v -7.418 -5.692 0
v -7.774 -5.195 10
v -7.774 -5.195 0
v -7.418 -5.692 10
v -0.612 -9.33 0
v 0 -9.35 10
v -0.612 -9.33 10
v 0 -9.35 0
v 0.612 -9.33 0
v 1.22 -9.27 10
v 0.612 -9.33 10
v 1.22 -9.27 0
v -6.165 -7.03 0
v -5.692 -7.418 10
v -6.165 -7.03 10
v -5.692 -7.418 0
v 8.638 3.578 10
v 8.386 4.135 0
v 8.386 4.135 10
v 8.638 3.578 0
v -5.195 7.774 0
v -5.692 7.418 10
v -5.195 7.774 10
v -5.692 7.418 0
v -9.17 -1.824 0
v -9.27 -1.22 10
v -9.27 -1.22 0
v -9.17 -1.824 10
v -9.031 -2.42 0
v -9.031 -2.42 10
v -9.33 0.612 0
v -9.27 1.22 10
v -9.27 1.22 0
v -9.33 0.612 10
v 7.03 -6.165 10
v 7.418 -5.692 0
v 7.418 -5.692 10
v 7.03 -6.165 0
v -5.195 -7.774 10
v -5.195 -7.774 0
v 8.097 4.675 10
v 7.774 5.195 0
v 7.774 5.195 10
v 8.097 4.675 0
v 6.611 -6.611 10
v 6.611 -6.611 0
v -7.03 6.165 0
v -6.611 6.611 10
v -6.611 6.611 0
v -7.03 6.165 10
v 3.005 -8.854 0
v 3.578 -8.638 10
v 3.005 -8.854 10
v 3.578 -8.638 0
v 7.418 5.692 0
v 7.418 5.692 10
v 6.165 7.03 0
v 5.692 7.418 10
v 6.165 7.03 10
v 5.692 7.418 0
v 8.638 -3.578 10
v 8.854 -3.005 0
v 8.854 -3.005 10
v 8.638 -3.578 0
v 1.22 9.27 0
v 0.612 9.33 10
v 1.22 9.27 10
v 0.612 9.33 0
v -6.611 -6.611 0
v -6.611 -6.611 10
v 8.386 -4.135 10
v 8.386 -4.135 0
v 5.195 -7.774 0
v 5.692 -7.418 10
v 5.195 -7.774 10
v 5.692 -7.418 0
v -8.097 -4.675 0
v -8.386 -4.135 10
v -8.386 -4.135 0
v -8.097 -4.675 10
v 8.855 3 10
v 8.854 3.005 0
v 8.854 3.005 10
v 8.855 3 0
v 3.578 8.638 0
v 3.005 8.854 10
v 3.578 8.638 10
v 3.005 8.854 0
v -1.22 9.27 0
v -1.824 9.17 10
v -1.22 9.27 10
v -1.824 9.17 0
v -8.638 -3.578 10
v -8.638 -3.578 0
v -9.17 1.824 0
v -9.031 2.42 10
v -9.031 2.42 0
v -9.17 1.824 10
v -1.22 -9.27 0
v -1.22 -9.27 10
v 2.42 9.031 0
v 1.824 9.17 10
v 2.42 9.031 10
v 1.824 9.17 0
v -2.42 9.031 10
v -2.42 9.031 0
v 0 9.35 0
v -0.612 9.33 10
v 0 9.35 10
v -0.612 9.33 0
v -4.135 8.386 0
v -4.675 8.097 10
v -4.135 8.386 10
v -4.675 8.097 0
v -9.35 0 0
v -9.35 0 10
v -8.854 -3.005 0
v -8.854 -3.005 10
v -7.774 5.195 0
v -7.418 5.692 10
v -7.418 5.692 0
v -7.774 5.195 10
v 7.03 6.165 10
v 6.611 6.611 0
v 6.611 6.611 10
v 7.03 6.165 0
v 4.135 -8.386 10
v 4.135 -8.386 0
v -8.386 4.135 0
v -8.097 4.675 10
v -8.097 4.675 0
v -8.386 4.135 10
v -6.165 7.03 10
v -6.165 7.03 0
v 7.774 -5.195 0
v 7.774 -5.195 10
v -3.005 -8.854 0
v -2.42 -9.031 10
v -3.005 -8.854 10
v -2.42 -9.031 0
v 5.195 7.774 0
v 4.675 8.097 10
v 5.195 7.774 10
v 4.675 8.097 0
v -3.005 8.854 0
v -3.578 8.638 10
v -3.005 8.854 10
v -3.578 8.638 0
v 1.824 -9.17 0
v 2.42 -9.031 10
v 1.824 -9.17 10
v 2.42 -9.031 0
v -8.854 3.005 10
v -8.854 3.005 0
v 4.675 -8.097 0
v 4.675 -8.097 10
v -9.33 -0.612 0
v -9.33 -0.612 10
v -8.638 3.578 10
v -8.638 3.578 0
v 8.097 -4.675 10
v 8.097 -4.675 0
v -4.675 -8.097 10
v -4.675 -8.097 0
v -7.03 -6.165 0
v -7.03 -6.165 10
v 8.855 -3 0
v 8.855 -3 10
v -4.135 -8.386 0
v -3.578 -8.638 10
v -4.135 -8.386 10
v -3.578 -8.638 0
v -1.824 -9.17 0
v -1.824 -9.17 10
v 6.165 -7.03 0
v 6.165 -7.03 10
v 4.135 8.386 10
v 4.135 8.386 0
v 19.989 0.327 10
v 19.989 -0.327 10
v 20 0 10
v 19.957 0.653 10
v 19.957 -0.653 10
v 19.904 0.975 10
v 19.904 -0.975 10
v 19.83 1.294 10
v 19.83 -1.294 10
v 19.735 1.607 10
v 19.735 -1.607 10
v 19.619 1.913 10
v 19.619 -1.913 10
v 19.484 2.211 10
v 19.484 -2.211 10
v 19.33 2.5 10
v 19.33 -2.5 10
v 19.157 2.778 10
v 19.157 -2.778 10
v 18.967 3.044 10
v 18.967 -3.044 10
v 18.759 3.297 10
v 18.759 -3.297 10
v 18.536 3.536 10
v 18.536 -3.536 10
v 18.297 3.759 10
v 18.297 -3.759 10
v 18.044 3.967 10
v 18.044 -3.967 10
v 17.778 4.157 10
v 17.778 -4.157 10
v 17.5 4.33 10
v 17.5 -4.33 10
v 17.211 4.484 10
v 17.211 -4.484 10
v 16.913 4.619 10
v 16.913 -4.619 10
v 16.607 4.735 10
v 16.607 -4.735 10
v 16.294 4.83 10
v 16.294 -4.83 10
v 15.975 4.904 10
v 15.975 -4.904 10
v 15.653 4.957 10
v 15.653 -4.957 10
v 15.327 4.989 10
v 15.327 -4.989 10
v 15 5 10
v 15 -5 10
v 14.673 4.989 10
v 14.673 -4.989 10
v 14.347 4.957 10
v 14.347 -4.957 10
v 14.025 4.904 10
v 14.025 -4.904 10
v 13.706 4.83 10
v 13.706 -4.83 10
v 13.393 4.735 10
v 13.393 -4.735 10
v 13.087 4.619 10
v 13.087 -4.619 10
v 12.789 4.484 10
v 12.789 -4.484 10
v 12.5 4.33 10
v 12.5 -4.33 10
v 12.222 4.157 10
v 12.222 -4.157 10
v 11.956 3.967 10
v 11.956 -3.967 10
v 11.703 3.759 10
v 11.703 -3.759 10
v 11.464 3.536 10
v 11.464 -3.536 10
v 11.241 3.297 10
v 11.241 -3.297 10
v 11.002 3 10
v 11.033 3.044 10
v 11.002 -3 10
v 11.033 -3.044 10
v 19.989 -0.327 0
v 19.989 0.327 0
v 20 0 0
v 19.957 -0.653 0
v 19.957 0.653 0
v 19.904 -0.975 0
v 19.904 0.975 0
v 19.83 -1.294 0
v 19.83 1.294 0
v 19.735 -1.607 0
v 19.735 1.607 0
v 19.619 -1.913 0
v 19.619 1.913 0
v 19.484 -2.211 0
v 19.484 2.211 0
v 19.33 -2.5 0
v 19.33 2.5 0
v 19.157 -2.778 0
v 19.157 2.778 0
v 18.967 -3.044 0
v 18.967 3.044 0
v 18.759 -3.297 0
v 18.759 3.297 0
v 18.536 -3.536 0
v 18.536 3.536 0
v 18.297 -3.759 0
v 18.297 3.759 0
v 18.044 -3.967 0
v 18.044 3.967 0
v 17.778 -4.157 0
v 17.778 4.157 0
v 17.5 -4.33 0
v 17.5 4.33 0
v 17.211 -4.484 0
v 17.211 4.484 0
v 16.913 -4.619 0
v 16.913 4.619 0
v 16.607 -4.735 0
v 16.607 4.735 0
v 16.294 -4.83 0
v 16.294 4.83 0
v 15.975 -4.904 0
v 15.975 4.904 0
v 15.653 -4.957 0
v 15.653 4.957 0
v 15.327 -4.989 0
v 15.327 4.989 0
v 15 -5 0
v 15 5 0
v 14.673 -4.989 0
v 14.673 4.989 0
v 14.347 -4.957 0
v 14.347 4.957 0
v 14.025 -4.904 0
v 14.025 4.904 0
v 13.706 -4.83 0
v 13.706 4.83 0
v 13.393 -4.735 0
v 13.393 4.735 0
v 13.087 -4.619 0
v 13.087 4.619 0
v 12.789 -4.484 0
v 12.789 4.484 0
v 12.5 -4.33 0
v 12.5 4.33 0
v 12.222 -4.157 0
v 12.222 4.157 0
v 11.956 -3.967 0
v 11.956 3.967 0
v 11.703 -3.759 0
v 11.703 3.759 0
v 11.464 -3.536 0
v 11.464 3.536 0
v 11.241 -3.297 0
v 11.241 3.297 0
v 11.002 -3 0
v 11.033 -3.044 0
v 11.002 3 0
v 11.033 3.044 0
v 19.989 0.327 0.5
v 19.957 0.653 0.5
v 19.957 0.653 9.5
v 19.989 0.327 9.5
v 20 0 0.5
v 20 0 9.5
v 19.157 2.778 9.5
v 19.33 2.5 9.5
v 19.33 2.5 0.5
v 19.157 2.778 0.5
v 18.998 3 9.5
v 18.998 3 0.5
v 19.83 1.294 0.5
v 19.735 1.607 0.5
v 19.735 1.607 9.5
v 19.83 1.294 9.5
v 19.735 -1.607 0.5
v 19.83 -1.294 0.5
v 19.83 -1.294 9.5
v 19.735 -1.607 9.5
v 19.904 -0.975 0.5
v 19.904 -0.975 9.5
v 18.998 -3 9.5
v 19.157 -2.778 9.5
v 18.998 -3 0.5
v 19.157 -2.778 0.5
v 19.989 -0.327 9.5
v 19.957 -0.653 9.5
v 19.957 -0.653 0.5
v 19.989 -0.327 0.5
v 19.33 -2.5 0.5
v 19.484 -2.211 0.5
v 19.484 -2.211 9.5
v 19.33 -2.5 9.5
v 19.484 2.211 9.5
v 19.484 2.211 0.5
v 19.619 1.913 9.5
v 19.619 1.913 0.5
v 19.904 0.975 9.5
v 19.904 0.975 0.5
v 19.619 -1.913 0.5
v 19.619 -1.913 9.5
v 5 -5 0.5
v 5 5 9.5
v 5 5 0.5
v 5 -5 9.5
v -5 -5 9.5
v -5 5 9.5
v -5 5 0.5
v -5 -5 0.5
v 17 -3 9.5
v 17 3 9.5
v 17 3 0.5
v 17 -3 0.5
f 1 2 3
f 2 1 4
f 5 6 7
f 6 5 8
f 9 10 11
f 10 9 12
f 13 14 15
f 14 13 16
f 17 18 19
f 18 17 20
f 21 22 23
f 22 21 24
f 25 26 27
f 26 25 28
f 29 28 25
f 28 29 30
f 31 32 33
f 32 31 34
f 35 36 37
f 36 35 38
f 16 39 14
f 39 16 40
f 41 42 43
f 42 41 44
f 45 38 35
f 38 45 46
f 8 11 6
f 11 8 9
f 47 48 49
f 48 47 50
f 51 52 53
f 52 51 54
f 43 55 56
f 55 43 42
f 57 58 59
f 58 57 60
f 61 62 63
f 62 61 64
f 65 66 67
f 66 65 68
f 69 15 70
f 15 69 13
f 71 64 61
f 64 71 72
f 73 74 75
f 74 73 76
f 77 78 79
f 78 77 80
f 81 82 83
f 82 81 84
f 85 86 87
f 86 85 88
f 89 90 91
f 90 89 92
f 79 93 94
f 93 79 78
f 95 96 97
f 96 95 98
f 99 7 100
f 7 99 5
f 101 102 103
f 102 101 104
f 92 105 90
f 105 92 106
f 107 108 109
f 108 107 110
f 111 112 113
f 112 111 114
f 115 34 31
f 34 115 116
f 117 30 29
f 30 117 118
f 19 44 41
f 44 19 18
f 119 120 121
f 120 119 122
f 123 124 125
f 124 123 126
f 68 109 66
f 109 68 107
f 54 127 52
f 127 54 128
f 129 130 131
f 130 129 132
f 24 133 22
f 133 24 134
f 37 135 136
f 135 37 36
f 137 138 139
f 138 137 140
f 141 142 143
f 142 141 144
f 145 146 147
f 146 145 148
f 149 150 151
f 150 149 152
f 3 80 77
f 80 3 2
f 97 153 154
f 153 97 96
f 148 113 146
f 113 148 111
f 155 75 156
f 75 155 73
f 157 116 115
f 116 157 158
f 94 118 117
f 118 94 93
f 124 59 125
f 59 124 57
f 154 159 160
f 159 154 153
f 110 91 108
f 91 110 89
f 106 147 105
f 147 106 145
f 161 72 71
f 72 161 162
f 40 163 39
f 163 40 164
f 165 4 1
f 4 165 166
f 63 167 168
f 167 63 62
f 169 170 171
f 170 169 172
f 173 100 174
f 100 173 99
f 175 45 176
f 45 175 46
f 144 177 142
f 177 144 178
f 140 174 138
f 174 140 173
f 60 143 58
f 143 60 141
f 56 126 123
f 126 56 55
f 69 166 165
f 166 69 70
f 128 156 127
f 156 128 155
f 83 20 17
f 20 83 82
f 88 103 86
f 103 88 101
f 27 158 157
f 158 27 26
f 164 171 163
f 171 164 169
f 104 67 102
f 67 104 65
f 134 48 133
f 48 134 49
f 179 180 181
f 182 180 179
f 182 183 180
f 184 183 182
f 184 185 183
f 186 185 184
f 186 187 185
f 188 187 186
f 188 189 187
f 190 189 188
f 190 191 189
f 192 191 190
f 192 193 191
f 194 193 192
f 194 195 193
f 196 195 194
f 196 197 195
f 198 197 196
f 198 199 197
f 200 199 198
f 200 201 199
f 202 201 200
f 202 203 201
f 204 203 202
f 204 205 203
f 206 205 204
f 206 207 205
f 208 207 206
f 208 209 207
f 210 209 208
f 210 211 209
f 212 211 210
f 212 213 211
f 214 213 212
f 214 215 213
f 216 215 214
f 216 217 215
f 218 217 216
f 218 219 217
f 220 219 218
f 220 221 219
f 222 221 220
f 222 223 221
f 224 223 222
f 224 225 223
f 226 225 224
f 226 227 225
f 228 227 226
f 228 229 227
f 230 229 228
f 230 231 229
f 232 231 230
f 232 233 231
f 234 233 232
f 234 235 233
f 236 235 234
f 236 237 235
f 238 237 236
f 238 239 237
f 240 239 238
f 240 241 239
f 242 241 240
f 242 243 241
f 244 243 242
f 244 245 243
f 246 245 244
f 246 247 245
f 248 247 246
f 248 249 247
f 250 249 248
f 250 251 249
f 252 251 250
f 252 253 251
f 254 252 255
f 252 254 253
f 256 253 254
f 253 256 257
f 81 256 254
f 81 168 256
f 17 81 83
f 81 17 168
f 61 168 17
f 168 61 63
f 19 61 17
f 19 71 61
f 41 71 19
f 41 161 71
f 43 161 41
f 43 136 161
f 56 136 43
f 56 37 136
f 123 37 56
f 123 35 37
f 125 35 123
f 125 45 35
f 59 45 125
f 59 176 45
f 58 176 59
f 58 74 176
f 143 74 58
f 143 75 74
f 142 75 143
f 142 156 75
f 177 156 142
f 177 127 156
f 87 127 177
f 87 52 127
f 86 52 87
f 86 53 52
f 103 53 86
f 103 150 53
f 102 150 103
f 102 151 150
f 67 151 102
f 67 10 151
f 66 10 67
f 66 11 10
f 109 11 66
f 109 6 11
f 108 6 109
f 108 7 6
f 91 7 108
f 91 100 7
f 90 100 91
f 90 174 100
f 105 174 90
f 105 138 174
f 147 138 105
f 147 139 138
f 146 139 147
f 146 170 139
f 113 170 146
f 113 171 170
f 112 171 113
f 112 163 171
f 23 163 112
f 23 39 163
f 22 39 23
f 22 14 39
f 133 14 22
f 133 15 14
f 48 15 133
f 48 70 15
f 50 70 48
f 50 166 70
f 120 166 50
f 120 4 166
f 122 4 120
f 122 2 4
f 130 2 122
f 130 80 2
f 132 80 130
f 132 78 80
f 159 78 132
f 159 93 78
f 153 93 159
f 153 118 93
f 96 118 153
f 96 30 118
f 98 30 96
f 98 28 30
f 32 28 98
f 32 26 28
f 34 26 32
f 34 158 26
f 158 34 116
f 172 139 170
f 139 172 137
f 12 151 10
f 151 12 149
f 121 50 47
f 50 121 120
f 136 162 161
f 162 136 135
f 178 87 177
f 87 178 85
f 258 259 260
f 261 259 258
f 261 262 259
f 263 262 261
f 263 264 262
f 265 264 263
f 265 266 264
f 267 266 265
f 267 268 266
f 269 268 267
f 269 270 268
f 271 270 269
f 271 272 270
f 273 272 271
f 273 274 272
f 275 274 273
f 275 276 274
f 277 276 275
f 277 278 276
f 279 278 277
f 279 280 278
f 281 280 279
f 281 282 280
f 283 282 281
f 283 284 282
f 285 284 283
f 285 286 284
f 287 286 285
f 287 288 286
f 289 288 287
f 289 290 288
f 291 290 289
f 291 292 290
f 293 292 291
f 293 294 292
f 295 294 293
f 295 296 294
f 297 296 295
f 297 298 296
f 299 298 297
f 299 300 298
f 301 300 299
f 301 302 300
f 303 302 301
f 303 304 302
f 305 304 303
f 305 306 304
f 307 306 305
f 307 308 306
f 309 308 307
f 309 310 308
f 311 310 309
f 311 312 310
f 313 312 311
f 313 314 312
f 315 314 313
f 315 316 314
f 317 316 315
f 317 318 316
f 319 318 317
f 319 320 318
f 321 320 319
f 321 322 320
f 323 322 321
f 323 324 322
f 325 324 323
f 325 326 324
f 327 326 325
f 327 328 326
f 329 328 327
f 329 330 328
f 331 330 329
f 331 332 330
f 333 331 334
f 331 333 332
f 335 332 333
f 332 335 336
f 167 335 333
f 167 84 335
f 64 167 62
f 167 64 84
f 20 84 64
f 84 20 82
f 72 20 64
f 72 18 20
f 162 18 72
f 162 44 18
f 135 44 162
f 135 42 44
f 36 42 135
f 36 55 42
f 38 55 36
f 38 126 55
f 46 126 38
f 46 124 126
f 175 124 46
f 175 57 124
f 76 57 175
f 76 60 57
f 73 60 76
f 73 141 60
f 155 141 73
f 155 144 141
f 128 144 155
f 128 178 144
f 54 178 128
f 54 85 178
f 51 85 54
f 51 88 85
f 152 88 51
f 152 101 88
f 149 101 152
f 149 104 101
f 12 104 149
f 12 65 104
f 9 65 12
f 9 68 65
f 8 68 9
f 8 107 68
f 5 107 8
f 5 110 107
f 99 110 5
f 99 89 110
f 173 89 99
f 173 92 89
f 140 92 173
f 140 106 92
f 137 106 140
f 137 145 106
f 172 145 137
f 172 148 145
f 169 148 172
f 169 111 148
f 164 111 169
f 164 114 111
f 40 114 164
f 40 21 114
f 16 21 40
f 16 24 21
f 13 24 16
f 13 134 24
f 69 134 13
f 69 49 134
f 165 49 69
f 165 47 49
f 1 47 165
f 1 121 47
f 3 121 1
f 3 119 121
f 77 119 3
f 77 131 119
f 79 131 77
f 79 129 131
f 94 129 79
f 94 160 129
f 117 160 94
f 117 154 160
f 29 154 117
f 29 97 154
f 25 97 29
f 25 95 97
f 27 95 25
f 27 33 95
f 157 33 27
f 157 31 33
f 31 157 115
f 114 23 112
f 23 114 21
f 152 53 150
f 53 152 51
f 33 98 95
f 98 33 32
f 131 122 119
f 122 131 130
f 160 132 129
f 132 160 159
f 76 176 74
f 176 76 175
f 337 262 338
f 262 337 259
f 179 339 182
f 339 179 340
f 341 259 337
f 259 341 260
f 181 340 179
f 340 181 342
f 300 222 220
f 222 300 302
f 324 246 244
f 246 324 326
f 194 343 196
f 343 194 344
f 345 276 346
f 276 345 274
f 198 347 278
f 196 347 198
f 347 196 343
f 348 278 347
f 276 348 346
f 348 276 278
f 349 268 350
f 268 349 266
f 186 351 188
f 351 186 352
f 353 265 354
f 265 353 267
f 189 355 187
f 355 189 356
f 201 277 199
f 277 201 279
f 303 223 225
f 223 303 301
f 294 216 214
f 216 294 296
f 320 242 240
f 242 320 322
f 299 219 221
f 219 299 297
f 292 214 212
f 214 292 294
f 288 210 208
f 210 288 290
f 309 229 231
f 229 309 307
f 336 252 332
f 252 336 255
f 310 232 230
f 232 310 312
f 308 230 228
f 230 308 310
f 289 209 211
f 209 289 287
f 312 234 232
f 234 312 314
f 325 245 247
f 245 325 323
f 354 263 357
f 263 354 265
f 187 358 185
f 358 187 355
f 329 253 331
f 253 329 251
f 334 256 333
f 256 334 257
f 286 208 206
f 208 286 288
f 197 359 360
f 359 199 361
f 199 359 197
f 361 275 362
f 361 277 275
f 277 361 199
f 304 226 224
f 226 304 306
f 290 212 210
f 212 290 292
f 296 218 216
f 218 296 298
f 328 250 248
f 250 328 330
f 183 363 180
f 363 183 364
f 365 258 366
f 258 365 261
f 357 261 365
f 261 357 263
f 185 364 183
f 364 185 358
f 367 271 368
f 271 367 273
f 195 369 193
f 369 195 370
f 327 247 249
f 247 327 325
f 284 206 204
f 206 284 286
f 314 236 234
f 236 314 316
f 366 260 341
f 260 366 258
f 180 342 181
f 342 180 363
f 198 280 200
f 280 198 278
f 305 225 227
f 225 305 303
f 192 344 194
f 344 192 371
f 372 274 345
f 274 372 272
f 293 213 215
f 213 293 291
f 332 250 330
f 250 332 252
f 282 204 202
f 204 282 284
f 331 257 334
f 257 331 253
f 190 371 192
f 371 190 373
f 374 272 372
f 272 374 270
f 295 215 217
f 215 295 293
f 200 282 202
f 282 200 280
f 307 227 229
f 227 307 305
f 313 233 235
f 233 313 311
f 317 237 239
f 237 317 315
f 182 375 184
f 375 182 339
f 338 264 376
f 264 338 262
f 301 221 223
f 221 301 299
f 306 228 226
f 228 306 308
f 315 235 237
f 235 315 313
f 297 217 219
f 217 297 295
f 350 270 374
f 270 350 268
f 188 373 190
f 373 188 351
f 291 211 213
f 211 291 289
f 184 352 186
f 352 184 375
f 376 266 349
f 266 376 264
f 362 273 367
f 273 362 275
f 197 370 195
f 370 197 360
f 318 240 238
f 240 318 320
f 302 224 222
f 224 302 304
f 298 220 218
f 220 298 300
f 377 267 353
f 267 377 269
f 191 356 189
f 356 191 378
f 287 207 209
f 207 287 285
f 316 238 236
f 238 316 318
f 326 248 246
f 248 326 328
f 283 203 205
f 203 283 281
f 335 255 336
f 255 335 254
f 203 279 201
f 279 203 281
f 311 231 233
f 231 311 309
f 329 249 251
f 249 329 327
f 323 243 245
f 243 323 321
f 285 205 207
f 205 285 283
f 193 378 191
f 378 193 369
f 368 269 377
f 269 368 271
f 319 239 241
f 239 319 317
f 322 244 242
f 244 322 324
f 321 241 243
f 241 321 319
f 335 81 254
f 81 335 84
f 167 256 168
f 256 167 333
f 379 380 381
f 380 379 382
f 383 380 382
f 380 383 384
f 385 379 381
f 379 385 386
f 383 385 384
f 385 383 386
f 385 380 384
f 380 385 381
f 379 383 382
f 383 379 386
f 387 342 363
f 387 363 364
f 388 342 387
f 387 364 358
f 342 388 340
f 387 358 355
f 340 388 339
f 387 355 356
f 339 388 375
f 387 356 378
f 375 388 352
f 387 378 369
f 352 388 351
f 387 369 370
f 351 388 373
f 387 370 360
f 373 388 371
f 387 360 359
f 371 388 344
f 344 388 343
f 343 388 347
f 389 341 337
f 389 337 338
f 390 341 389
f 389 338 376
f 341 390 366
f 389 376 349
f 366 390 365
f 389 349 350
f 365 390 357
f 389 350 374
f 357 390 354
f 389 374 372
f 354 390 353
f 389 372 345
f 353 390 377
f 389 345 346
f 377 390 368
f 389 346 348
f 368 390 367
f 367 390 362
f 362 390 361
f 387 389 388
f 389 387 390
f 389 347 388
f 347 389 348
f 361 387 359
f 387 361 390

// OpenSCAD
// Tubing clip for a 12.7 mm lab stand rod
// Print orientation: flat on the bed, extruded upward along +Z

// ---------------- Parameters ----------------
ring_id      = 12.7;   // rod ring inner diameter (stand rod clearance)
ring_wall    = 3;      // rod ring wall thickness
ring_od      = ring_id + 2 * ring_wall; // rod ring outer diameter (18.7)
ring_x       = 0;      // rod ring centre X
ring_y       = 0;      // rod ring centre Y

tub_id       = 6;      // tubing ring inner diameter
tub_wall     = 2;      // tubing ring wall thickness
tub_od       = tub_id + 2 * tub_wall; // tubing ring outer diameter (10)
tub_x        = 15;     // tubing ring centre X
tub_y        = 0;      // tubing ring centre Y

bridge_x1    = 8;      // bridge start X
bridge_x2    = 12;     // bridge end X
bridge_w     = 6;      // bridge width in Y

opening_w    = 10;     // rod ring opening width (-X side)
open_x       = -0.5;   // opening cut overshoot past the X face

height       = 10;     // extrusion height (Z)

$fn = 96;

// ---------------- Model ----------------
difference() {
    union() {
        // Rod ring
        cylinder(d = ring_od, h = height);
        // Tubing ring
        translate([tub_x, tub_y, 0])
            cylinder(d = tub_od, h = height);
        // Solid bridge between the rings
        translate([bridge_x1, -bridge_w / 2, 0])
            cube([bridge_x2 - bridge_x1, bridge_w, height]);
    }

    // Rod ring opening cut out of the -X side
    translate([ring_x - opening_w / 2, ring_y - opening_w / 2, -open_x])
        cube([opening_w, opening_w, height + 2 * open_x]);

    // Tubing ring opening cut out of the +X side
    translate([tub_x + tub_wall, tub_y - tub_id / 2, -open_x])
        cube([opening_w, tub_id, height + 2 * open_x]);
}
